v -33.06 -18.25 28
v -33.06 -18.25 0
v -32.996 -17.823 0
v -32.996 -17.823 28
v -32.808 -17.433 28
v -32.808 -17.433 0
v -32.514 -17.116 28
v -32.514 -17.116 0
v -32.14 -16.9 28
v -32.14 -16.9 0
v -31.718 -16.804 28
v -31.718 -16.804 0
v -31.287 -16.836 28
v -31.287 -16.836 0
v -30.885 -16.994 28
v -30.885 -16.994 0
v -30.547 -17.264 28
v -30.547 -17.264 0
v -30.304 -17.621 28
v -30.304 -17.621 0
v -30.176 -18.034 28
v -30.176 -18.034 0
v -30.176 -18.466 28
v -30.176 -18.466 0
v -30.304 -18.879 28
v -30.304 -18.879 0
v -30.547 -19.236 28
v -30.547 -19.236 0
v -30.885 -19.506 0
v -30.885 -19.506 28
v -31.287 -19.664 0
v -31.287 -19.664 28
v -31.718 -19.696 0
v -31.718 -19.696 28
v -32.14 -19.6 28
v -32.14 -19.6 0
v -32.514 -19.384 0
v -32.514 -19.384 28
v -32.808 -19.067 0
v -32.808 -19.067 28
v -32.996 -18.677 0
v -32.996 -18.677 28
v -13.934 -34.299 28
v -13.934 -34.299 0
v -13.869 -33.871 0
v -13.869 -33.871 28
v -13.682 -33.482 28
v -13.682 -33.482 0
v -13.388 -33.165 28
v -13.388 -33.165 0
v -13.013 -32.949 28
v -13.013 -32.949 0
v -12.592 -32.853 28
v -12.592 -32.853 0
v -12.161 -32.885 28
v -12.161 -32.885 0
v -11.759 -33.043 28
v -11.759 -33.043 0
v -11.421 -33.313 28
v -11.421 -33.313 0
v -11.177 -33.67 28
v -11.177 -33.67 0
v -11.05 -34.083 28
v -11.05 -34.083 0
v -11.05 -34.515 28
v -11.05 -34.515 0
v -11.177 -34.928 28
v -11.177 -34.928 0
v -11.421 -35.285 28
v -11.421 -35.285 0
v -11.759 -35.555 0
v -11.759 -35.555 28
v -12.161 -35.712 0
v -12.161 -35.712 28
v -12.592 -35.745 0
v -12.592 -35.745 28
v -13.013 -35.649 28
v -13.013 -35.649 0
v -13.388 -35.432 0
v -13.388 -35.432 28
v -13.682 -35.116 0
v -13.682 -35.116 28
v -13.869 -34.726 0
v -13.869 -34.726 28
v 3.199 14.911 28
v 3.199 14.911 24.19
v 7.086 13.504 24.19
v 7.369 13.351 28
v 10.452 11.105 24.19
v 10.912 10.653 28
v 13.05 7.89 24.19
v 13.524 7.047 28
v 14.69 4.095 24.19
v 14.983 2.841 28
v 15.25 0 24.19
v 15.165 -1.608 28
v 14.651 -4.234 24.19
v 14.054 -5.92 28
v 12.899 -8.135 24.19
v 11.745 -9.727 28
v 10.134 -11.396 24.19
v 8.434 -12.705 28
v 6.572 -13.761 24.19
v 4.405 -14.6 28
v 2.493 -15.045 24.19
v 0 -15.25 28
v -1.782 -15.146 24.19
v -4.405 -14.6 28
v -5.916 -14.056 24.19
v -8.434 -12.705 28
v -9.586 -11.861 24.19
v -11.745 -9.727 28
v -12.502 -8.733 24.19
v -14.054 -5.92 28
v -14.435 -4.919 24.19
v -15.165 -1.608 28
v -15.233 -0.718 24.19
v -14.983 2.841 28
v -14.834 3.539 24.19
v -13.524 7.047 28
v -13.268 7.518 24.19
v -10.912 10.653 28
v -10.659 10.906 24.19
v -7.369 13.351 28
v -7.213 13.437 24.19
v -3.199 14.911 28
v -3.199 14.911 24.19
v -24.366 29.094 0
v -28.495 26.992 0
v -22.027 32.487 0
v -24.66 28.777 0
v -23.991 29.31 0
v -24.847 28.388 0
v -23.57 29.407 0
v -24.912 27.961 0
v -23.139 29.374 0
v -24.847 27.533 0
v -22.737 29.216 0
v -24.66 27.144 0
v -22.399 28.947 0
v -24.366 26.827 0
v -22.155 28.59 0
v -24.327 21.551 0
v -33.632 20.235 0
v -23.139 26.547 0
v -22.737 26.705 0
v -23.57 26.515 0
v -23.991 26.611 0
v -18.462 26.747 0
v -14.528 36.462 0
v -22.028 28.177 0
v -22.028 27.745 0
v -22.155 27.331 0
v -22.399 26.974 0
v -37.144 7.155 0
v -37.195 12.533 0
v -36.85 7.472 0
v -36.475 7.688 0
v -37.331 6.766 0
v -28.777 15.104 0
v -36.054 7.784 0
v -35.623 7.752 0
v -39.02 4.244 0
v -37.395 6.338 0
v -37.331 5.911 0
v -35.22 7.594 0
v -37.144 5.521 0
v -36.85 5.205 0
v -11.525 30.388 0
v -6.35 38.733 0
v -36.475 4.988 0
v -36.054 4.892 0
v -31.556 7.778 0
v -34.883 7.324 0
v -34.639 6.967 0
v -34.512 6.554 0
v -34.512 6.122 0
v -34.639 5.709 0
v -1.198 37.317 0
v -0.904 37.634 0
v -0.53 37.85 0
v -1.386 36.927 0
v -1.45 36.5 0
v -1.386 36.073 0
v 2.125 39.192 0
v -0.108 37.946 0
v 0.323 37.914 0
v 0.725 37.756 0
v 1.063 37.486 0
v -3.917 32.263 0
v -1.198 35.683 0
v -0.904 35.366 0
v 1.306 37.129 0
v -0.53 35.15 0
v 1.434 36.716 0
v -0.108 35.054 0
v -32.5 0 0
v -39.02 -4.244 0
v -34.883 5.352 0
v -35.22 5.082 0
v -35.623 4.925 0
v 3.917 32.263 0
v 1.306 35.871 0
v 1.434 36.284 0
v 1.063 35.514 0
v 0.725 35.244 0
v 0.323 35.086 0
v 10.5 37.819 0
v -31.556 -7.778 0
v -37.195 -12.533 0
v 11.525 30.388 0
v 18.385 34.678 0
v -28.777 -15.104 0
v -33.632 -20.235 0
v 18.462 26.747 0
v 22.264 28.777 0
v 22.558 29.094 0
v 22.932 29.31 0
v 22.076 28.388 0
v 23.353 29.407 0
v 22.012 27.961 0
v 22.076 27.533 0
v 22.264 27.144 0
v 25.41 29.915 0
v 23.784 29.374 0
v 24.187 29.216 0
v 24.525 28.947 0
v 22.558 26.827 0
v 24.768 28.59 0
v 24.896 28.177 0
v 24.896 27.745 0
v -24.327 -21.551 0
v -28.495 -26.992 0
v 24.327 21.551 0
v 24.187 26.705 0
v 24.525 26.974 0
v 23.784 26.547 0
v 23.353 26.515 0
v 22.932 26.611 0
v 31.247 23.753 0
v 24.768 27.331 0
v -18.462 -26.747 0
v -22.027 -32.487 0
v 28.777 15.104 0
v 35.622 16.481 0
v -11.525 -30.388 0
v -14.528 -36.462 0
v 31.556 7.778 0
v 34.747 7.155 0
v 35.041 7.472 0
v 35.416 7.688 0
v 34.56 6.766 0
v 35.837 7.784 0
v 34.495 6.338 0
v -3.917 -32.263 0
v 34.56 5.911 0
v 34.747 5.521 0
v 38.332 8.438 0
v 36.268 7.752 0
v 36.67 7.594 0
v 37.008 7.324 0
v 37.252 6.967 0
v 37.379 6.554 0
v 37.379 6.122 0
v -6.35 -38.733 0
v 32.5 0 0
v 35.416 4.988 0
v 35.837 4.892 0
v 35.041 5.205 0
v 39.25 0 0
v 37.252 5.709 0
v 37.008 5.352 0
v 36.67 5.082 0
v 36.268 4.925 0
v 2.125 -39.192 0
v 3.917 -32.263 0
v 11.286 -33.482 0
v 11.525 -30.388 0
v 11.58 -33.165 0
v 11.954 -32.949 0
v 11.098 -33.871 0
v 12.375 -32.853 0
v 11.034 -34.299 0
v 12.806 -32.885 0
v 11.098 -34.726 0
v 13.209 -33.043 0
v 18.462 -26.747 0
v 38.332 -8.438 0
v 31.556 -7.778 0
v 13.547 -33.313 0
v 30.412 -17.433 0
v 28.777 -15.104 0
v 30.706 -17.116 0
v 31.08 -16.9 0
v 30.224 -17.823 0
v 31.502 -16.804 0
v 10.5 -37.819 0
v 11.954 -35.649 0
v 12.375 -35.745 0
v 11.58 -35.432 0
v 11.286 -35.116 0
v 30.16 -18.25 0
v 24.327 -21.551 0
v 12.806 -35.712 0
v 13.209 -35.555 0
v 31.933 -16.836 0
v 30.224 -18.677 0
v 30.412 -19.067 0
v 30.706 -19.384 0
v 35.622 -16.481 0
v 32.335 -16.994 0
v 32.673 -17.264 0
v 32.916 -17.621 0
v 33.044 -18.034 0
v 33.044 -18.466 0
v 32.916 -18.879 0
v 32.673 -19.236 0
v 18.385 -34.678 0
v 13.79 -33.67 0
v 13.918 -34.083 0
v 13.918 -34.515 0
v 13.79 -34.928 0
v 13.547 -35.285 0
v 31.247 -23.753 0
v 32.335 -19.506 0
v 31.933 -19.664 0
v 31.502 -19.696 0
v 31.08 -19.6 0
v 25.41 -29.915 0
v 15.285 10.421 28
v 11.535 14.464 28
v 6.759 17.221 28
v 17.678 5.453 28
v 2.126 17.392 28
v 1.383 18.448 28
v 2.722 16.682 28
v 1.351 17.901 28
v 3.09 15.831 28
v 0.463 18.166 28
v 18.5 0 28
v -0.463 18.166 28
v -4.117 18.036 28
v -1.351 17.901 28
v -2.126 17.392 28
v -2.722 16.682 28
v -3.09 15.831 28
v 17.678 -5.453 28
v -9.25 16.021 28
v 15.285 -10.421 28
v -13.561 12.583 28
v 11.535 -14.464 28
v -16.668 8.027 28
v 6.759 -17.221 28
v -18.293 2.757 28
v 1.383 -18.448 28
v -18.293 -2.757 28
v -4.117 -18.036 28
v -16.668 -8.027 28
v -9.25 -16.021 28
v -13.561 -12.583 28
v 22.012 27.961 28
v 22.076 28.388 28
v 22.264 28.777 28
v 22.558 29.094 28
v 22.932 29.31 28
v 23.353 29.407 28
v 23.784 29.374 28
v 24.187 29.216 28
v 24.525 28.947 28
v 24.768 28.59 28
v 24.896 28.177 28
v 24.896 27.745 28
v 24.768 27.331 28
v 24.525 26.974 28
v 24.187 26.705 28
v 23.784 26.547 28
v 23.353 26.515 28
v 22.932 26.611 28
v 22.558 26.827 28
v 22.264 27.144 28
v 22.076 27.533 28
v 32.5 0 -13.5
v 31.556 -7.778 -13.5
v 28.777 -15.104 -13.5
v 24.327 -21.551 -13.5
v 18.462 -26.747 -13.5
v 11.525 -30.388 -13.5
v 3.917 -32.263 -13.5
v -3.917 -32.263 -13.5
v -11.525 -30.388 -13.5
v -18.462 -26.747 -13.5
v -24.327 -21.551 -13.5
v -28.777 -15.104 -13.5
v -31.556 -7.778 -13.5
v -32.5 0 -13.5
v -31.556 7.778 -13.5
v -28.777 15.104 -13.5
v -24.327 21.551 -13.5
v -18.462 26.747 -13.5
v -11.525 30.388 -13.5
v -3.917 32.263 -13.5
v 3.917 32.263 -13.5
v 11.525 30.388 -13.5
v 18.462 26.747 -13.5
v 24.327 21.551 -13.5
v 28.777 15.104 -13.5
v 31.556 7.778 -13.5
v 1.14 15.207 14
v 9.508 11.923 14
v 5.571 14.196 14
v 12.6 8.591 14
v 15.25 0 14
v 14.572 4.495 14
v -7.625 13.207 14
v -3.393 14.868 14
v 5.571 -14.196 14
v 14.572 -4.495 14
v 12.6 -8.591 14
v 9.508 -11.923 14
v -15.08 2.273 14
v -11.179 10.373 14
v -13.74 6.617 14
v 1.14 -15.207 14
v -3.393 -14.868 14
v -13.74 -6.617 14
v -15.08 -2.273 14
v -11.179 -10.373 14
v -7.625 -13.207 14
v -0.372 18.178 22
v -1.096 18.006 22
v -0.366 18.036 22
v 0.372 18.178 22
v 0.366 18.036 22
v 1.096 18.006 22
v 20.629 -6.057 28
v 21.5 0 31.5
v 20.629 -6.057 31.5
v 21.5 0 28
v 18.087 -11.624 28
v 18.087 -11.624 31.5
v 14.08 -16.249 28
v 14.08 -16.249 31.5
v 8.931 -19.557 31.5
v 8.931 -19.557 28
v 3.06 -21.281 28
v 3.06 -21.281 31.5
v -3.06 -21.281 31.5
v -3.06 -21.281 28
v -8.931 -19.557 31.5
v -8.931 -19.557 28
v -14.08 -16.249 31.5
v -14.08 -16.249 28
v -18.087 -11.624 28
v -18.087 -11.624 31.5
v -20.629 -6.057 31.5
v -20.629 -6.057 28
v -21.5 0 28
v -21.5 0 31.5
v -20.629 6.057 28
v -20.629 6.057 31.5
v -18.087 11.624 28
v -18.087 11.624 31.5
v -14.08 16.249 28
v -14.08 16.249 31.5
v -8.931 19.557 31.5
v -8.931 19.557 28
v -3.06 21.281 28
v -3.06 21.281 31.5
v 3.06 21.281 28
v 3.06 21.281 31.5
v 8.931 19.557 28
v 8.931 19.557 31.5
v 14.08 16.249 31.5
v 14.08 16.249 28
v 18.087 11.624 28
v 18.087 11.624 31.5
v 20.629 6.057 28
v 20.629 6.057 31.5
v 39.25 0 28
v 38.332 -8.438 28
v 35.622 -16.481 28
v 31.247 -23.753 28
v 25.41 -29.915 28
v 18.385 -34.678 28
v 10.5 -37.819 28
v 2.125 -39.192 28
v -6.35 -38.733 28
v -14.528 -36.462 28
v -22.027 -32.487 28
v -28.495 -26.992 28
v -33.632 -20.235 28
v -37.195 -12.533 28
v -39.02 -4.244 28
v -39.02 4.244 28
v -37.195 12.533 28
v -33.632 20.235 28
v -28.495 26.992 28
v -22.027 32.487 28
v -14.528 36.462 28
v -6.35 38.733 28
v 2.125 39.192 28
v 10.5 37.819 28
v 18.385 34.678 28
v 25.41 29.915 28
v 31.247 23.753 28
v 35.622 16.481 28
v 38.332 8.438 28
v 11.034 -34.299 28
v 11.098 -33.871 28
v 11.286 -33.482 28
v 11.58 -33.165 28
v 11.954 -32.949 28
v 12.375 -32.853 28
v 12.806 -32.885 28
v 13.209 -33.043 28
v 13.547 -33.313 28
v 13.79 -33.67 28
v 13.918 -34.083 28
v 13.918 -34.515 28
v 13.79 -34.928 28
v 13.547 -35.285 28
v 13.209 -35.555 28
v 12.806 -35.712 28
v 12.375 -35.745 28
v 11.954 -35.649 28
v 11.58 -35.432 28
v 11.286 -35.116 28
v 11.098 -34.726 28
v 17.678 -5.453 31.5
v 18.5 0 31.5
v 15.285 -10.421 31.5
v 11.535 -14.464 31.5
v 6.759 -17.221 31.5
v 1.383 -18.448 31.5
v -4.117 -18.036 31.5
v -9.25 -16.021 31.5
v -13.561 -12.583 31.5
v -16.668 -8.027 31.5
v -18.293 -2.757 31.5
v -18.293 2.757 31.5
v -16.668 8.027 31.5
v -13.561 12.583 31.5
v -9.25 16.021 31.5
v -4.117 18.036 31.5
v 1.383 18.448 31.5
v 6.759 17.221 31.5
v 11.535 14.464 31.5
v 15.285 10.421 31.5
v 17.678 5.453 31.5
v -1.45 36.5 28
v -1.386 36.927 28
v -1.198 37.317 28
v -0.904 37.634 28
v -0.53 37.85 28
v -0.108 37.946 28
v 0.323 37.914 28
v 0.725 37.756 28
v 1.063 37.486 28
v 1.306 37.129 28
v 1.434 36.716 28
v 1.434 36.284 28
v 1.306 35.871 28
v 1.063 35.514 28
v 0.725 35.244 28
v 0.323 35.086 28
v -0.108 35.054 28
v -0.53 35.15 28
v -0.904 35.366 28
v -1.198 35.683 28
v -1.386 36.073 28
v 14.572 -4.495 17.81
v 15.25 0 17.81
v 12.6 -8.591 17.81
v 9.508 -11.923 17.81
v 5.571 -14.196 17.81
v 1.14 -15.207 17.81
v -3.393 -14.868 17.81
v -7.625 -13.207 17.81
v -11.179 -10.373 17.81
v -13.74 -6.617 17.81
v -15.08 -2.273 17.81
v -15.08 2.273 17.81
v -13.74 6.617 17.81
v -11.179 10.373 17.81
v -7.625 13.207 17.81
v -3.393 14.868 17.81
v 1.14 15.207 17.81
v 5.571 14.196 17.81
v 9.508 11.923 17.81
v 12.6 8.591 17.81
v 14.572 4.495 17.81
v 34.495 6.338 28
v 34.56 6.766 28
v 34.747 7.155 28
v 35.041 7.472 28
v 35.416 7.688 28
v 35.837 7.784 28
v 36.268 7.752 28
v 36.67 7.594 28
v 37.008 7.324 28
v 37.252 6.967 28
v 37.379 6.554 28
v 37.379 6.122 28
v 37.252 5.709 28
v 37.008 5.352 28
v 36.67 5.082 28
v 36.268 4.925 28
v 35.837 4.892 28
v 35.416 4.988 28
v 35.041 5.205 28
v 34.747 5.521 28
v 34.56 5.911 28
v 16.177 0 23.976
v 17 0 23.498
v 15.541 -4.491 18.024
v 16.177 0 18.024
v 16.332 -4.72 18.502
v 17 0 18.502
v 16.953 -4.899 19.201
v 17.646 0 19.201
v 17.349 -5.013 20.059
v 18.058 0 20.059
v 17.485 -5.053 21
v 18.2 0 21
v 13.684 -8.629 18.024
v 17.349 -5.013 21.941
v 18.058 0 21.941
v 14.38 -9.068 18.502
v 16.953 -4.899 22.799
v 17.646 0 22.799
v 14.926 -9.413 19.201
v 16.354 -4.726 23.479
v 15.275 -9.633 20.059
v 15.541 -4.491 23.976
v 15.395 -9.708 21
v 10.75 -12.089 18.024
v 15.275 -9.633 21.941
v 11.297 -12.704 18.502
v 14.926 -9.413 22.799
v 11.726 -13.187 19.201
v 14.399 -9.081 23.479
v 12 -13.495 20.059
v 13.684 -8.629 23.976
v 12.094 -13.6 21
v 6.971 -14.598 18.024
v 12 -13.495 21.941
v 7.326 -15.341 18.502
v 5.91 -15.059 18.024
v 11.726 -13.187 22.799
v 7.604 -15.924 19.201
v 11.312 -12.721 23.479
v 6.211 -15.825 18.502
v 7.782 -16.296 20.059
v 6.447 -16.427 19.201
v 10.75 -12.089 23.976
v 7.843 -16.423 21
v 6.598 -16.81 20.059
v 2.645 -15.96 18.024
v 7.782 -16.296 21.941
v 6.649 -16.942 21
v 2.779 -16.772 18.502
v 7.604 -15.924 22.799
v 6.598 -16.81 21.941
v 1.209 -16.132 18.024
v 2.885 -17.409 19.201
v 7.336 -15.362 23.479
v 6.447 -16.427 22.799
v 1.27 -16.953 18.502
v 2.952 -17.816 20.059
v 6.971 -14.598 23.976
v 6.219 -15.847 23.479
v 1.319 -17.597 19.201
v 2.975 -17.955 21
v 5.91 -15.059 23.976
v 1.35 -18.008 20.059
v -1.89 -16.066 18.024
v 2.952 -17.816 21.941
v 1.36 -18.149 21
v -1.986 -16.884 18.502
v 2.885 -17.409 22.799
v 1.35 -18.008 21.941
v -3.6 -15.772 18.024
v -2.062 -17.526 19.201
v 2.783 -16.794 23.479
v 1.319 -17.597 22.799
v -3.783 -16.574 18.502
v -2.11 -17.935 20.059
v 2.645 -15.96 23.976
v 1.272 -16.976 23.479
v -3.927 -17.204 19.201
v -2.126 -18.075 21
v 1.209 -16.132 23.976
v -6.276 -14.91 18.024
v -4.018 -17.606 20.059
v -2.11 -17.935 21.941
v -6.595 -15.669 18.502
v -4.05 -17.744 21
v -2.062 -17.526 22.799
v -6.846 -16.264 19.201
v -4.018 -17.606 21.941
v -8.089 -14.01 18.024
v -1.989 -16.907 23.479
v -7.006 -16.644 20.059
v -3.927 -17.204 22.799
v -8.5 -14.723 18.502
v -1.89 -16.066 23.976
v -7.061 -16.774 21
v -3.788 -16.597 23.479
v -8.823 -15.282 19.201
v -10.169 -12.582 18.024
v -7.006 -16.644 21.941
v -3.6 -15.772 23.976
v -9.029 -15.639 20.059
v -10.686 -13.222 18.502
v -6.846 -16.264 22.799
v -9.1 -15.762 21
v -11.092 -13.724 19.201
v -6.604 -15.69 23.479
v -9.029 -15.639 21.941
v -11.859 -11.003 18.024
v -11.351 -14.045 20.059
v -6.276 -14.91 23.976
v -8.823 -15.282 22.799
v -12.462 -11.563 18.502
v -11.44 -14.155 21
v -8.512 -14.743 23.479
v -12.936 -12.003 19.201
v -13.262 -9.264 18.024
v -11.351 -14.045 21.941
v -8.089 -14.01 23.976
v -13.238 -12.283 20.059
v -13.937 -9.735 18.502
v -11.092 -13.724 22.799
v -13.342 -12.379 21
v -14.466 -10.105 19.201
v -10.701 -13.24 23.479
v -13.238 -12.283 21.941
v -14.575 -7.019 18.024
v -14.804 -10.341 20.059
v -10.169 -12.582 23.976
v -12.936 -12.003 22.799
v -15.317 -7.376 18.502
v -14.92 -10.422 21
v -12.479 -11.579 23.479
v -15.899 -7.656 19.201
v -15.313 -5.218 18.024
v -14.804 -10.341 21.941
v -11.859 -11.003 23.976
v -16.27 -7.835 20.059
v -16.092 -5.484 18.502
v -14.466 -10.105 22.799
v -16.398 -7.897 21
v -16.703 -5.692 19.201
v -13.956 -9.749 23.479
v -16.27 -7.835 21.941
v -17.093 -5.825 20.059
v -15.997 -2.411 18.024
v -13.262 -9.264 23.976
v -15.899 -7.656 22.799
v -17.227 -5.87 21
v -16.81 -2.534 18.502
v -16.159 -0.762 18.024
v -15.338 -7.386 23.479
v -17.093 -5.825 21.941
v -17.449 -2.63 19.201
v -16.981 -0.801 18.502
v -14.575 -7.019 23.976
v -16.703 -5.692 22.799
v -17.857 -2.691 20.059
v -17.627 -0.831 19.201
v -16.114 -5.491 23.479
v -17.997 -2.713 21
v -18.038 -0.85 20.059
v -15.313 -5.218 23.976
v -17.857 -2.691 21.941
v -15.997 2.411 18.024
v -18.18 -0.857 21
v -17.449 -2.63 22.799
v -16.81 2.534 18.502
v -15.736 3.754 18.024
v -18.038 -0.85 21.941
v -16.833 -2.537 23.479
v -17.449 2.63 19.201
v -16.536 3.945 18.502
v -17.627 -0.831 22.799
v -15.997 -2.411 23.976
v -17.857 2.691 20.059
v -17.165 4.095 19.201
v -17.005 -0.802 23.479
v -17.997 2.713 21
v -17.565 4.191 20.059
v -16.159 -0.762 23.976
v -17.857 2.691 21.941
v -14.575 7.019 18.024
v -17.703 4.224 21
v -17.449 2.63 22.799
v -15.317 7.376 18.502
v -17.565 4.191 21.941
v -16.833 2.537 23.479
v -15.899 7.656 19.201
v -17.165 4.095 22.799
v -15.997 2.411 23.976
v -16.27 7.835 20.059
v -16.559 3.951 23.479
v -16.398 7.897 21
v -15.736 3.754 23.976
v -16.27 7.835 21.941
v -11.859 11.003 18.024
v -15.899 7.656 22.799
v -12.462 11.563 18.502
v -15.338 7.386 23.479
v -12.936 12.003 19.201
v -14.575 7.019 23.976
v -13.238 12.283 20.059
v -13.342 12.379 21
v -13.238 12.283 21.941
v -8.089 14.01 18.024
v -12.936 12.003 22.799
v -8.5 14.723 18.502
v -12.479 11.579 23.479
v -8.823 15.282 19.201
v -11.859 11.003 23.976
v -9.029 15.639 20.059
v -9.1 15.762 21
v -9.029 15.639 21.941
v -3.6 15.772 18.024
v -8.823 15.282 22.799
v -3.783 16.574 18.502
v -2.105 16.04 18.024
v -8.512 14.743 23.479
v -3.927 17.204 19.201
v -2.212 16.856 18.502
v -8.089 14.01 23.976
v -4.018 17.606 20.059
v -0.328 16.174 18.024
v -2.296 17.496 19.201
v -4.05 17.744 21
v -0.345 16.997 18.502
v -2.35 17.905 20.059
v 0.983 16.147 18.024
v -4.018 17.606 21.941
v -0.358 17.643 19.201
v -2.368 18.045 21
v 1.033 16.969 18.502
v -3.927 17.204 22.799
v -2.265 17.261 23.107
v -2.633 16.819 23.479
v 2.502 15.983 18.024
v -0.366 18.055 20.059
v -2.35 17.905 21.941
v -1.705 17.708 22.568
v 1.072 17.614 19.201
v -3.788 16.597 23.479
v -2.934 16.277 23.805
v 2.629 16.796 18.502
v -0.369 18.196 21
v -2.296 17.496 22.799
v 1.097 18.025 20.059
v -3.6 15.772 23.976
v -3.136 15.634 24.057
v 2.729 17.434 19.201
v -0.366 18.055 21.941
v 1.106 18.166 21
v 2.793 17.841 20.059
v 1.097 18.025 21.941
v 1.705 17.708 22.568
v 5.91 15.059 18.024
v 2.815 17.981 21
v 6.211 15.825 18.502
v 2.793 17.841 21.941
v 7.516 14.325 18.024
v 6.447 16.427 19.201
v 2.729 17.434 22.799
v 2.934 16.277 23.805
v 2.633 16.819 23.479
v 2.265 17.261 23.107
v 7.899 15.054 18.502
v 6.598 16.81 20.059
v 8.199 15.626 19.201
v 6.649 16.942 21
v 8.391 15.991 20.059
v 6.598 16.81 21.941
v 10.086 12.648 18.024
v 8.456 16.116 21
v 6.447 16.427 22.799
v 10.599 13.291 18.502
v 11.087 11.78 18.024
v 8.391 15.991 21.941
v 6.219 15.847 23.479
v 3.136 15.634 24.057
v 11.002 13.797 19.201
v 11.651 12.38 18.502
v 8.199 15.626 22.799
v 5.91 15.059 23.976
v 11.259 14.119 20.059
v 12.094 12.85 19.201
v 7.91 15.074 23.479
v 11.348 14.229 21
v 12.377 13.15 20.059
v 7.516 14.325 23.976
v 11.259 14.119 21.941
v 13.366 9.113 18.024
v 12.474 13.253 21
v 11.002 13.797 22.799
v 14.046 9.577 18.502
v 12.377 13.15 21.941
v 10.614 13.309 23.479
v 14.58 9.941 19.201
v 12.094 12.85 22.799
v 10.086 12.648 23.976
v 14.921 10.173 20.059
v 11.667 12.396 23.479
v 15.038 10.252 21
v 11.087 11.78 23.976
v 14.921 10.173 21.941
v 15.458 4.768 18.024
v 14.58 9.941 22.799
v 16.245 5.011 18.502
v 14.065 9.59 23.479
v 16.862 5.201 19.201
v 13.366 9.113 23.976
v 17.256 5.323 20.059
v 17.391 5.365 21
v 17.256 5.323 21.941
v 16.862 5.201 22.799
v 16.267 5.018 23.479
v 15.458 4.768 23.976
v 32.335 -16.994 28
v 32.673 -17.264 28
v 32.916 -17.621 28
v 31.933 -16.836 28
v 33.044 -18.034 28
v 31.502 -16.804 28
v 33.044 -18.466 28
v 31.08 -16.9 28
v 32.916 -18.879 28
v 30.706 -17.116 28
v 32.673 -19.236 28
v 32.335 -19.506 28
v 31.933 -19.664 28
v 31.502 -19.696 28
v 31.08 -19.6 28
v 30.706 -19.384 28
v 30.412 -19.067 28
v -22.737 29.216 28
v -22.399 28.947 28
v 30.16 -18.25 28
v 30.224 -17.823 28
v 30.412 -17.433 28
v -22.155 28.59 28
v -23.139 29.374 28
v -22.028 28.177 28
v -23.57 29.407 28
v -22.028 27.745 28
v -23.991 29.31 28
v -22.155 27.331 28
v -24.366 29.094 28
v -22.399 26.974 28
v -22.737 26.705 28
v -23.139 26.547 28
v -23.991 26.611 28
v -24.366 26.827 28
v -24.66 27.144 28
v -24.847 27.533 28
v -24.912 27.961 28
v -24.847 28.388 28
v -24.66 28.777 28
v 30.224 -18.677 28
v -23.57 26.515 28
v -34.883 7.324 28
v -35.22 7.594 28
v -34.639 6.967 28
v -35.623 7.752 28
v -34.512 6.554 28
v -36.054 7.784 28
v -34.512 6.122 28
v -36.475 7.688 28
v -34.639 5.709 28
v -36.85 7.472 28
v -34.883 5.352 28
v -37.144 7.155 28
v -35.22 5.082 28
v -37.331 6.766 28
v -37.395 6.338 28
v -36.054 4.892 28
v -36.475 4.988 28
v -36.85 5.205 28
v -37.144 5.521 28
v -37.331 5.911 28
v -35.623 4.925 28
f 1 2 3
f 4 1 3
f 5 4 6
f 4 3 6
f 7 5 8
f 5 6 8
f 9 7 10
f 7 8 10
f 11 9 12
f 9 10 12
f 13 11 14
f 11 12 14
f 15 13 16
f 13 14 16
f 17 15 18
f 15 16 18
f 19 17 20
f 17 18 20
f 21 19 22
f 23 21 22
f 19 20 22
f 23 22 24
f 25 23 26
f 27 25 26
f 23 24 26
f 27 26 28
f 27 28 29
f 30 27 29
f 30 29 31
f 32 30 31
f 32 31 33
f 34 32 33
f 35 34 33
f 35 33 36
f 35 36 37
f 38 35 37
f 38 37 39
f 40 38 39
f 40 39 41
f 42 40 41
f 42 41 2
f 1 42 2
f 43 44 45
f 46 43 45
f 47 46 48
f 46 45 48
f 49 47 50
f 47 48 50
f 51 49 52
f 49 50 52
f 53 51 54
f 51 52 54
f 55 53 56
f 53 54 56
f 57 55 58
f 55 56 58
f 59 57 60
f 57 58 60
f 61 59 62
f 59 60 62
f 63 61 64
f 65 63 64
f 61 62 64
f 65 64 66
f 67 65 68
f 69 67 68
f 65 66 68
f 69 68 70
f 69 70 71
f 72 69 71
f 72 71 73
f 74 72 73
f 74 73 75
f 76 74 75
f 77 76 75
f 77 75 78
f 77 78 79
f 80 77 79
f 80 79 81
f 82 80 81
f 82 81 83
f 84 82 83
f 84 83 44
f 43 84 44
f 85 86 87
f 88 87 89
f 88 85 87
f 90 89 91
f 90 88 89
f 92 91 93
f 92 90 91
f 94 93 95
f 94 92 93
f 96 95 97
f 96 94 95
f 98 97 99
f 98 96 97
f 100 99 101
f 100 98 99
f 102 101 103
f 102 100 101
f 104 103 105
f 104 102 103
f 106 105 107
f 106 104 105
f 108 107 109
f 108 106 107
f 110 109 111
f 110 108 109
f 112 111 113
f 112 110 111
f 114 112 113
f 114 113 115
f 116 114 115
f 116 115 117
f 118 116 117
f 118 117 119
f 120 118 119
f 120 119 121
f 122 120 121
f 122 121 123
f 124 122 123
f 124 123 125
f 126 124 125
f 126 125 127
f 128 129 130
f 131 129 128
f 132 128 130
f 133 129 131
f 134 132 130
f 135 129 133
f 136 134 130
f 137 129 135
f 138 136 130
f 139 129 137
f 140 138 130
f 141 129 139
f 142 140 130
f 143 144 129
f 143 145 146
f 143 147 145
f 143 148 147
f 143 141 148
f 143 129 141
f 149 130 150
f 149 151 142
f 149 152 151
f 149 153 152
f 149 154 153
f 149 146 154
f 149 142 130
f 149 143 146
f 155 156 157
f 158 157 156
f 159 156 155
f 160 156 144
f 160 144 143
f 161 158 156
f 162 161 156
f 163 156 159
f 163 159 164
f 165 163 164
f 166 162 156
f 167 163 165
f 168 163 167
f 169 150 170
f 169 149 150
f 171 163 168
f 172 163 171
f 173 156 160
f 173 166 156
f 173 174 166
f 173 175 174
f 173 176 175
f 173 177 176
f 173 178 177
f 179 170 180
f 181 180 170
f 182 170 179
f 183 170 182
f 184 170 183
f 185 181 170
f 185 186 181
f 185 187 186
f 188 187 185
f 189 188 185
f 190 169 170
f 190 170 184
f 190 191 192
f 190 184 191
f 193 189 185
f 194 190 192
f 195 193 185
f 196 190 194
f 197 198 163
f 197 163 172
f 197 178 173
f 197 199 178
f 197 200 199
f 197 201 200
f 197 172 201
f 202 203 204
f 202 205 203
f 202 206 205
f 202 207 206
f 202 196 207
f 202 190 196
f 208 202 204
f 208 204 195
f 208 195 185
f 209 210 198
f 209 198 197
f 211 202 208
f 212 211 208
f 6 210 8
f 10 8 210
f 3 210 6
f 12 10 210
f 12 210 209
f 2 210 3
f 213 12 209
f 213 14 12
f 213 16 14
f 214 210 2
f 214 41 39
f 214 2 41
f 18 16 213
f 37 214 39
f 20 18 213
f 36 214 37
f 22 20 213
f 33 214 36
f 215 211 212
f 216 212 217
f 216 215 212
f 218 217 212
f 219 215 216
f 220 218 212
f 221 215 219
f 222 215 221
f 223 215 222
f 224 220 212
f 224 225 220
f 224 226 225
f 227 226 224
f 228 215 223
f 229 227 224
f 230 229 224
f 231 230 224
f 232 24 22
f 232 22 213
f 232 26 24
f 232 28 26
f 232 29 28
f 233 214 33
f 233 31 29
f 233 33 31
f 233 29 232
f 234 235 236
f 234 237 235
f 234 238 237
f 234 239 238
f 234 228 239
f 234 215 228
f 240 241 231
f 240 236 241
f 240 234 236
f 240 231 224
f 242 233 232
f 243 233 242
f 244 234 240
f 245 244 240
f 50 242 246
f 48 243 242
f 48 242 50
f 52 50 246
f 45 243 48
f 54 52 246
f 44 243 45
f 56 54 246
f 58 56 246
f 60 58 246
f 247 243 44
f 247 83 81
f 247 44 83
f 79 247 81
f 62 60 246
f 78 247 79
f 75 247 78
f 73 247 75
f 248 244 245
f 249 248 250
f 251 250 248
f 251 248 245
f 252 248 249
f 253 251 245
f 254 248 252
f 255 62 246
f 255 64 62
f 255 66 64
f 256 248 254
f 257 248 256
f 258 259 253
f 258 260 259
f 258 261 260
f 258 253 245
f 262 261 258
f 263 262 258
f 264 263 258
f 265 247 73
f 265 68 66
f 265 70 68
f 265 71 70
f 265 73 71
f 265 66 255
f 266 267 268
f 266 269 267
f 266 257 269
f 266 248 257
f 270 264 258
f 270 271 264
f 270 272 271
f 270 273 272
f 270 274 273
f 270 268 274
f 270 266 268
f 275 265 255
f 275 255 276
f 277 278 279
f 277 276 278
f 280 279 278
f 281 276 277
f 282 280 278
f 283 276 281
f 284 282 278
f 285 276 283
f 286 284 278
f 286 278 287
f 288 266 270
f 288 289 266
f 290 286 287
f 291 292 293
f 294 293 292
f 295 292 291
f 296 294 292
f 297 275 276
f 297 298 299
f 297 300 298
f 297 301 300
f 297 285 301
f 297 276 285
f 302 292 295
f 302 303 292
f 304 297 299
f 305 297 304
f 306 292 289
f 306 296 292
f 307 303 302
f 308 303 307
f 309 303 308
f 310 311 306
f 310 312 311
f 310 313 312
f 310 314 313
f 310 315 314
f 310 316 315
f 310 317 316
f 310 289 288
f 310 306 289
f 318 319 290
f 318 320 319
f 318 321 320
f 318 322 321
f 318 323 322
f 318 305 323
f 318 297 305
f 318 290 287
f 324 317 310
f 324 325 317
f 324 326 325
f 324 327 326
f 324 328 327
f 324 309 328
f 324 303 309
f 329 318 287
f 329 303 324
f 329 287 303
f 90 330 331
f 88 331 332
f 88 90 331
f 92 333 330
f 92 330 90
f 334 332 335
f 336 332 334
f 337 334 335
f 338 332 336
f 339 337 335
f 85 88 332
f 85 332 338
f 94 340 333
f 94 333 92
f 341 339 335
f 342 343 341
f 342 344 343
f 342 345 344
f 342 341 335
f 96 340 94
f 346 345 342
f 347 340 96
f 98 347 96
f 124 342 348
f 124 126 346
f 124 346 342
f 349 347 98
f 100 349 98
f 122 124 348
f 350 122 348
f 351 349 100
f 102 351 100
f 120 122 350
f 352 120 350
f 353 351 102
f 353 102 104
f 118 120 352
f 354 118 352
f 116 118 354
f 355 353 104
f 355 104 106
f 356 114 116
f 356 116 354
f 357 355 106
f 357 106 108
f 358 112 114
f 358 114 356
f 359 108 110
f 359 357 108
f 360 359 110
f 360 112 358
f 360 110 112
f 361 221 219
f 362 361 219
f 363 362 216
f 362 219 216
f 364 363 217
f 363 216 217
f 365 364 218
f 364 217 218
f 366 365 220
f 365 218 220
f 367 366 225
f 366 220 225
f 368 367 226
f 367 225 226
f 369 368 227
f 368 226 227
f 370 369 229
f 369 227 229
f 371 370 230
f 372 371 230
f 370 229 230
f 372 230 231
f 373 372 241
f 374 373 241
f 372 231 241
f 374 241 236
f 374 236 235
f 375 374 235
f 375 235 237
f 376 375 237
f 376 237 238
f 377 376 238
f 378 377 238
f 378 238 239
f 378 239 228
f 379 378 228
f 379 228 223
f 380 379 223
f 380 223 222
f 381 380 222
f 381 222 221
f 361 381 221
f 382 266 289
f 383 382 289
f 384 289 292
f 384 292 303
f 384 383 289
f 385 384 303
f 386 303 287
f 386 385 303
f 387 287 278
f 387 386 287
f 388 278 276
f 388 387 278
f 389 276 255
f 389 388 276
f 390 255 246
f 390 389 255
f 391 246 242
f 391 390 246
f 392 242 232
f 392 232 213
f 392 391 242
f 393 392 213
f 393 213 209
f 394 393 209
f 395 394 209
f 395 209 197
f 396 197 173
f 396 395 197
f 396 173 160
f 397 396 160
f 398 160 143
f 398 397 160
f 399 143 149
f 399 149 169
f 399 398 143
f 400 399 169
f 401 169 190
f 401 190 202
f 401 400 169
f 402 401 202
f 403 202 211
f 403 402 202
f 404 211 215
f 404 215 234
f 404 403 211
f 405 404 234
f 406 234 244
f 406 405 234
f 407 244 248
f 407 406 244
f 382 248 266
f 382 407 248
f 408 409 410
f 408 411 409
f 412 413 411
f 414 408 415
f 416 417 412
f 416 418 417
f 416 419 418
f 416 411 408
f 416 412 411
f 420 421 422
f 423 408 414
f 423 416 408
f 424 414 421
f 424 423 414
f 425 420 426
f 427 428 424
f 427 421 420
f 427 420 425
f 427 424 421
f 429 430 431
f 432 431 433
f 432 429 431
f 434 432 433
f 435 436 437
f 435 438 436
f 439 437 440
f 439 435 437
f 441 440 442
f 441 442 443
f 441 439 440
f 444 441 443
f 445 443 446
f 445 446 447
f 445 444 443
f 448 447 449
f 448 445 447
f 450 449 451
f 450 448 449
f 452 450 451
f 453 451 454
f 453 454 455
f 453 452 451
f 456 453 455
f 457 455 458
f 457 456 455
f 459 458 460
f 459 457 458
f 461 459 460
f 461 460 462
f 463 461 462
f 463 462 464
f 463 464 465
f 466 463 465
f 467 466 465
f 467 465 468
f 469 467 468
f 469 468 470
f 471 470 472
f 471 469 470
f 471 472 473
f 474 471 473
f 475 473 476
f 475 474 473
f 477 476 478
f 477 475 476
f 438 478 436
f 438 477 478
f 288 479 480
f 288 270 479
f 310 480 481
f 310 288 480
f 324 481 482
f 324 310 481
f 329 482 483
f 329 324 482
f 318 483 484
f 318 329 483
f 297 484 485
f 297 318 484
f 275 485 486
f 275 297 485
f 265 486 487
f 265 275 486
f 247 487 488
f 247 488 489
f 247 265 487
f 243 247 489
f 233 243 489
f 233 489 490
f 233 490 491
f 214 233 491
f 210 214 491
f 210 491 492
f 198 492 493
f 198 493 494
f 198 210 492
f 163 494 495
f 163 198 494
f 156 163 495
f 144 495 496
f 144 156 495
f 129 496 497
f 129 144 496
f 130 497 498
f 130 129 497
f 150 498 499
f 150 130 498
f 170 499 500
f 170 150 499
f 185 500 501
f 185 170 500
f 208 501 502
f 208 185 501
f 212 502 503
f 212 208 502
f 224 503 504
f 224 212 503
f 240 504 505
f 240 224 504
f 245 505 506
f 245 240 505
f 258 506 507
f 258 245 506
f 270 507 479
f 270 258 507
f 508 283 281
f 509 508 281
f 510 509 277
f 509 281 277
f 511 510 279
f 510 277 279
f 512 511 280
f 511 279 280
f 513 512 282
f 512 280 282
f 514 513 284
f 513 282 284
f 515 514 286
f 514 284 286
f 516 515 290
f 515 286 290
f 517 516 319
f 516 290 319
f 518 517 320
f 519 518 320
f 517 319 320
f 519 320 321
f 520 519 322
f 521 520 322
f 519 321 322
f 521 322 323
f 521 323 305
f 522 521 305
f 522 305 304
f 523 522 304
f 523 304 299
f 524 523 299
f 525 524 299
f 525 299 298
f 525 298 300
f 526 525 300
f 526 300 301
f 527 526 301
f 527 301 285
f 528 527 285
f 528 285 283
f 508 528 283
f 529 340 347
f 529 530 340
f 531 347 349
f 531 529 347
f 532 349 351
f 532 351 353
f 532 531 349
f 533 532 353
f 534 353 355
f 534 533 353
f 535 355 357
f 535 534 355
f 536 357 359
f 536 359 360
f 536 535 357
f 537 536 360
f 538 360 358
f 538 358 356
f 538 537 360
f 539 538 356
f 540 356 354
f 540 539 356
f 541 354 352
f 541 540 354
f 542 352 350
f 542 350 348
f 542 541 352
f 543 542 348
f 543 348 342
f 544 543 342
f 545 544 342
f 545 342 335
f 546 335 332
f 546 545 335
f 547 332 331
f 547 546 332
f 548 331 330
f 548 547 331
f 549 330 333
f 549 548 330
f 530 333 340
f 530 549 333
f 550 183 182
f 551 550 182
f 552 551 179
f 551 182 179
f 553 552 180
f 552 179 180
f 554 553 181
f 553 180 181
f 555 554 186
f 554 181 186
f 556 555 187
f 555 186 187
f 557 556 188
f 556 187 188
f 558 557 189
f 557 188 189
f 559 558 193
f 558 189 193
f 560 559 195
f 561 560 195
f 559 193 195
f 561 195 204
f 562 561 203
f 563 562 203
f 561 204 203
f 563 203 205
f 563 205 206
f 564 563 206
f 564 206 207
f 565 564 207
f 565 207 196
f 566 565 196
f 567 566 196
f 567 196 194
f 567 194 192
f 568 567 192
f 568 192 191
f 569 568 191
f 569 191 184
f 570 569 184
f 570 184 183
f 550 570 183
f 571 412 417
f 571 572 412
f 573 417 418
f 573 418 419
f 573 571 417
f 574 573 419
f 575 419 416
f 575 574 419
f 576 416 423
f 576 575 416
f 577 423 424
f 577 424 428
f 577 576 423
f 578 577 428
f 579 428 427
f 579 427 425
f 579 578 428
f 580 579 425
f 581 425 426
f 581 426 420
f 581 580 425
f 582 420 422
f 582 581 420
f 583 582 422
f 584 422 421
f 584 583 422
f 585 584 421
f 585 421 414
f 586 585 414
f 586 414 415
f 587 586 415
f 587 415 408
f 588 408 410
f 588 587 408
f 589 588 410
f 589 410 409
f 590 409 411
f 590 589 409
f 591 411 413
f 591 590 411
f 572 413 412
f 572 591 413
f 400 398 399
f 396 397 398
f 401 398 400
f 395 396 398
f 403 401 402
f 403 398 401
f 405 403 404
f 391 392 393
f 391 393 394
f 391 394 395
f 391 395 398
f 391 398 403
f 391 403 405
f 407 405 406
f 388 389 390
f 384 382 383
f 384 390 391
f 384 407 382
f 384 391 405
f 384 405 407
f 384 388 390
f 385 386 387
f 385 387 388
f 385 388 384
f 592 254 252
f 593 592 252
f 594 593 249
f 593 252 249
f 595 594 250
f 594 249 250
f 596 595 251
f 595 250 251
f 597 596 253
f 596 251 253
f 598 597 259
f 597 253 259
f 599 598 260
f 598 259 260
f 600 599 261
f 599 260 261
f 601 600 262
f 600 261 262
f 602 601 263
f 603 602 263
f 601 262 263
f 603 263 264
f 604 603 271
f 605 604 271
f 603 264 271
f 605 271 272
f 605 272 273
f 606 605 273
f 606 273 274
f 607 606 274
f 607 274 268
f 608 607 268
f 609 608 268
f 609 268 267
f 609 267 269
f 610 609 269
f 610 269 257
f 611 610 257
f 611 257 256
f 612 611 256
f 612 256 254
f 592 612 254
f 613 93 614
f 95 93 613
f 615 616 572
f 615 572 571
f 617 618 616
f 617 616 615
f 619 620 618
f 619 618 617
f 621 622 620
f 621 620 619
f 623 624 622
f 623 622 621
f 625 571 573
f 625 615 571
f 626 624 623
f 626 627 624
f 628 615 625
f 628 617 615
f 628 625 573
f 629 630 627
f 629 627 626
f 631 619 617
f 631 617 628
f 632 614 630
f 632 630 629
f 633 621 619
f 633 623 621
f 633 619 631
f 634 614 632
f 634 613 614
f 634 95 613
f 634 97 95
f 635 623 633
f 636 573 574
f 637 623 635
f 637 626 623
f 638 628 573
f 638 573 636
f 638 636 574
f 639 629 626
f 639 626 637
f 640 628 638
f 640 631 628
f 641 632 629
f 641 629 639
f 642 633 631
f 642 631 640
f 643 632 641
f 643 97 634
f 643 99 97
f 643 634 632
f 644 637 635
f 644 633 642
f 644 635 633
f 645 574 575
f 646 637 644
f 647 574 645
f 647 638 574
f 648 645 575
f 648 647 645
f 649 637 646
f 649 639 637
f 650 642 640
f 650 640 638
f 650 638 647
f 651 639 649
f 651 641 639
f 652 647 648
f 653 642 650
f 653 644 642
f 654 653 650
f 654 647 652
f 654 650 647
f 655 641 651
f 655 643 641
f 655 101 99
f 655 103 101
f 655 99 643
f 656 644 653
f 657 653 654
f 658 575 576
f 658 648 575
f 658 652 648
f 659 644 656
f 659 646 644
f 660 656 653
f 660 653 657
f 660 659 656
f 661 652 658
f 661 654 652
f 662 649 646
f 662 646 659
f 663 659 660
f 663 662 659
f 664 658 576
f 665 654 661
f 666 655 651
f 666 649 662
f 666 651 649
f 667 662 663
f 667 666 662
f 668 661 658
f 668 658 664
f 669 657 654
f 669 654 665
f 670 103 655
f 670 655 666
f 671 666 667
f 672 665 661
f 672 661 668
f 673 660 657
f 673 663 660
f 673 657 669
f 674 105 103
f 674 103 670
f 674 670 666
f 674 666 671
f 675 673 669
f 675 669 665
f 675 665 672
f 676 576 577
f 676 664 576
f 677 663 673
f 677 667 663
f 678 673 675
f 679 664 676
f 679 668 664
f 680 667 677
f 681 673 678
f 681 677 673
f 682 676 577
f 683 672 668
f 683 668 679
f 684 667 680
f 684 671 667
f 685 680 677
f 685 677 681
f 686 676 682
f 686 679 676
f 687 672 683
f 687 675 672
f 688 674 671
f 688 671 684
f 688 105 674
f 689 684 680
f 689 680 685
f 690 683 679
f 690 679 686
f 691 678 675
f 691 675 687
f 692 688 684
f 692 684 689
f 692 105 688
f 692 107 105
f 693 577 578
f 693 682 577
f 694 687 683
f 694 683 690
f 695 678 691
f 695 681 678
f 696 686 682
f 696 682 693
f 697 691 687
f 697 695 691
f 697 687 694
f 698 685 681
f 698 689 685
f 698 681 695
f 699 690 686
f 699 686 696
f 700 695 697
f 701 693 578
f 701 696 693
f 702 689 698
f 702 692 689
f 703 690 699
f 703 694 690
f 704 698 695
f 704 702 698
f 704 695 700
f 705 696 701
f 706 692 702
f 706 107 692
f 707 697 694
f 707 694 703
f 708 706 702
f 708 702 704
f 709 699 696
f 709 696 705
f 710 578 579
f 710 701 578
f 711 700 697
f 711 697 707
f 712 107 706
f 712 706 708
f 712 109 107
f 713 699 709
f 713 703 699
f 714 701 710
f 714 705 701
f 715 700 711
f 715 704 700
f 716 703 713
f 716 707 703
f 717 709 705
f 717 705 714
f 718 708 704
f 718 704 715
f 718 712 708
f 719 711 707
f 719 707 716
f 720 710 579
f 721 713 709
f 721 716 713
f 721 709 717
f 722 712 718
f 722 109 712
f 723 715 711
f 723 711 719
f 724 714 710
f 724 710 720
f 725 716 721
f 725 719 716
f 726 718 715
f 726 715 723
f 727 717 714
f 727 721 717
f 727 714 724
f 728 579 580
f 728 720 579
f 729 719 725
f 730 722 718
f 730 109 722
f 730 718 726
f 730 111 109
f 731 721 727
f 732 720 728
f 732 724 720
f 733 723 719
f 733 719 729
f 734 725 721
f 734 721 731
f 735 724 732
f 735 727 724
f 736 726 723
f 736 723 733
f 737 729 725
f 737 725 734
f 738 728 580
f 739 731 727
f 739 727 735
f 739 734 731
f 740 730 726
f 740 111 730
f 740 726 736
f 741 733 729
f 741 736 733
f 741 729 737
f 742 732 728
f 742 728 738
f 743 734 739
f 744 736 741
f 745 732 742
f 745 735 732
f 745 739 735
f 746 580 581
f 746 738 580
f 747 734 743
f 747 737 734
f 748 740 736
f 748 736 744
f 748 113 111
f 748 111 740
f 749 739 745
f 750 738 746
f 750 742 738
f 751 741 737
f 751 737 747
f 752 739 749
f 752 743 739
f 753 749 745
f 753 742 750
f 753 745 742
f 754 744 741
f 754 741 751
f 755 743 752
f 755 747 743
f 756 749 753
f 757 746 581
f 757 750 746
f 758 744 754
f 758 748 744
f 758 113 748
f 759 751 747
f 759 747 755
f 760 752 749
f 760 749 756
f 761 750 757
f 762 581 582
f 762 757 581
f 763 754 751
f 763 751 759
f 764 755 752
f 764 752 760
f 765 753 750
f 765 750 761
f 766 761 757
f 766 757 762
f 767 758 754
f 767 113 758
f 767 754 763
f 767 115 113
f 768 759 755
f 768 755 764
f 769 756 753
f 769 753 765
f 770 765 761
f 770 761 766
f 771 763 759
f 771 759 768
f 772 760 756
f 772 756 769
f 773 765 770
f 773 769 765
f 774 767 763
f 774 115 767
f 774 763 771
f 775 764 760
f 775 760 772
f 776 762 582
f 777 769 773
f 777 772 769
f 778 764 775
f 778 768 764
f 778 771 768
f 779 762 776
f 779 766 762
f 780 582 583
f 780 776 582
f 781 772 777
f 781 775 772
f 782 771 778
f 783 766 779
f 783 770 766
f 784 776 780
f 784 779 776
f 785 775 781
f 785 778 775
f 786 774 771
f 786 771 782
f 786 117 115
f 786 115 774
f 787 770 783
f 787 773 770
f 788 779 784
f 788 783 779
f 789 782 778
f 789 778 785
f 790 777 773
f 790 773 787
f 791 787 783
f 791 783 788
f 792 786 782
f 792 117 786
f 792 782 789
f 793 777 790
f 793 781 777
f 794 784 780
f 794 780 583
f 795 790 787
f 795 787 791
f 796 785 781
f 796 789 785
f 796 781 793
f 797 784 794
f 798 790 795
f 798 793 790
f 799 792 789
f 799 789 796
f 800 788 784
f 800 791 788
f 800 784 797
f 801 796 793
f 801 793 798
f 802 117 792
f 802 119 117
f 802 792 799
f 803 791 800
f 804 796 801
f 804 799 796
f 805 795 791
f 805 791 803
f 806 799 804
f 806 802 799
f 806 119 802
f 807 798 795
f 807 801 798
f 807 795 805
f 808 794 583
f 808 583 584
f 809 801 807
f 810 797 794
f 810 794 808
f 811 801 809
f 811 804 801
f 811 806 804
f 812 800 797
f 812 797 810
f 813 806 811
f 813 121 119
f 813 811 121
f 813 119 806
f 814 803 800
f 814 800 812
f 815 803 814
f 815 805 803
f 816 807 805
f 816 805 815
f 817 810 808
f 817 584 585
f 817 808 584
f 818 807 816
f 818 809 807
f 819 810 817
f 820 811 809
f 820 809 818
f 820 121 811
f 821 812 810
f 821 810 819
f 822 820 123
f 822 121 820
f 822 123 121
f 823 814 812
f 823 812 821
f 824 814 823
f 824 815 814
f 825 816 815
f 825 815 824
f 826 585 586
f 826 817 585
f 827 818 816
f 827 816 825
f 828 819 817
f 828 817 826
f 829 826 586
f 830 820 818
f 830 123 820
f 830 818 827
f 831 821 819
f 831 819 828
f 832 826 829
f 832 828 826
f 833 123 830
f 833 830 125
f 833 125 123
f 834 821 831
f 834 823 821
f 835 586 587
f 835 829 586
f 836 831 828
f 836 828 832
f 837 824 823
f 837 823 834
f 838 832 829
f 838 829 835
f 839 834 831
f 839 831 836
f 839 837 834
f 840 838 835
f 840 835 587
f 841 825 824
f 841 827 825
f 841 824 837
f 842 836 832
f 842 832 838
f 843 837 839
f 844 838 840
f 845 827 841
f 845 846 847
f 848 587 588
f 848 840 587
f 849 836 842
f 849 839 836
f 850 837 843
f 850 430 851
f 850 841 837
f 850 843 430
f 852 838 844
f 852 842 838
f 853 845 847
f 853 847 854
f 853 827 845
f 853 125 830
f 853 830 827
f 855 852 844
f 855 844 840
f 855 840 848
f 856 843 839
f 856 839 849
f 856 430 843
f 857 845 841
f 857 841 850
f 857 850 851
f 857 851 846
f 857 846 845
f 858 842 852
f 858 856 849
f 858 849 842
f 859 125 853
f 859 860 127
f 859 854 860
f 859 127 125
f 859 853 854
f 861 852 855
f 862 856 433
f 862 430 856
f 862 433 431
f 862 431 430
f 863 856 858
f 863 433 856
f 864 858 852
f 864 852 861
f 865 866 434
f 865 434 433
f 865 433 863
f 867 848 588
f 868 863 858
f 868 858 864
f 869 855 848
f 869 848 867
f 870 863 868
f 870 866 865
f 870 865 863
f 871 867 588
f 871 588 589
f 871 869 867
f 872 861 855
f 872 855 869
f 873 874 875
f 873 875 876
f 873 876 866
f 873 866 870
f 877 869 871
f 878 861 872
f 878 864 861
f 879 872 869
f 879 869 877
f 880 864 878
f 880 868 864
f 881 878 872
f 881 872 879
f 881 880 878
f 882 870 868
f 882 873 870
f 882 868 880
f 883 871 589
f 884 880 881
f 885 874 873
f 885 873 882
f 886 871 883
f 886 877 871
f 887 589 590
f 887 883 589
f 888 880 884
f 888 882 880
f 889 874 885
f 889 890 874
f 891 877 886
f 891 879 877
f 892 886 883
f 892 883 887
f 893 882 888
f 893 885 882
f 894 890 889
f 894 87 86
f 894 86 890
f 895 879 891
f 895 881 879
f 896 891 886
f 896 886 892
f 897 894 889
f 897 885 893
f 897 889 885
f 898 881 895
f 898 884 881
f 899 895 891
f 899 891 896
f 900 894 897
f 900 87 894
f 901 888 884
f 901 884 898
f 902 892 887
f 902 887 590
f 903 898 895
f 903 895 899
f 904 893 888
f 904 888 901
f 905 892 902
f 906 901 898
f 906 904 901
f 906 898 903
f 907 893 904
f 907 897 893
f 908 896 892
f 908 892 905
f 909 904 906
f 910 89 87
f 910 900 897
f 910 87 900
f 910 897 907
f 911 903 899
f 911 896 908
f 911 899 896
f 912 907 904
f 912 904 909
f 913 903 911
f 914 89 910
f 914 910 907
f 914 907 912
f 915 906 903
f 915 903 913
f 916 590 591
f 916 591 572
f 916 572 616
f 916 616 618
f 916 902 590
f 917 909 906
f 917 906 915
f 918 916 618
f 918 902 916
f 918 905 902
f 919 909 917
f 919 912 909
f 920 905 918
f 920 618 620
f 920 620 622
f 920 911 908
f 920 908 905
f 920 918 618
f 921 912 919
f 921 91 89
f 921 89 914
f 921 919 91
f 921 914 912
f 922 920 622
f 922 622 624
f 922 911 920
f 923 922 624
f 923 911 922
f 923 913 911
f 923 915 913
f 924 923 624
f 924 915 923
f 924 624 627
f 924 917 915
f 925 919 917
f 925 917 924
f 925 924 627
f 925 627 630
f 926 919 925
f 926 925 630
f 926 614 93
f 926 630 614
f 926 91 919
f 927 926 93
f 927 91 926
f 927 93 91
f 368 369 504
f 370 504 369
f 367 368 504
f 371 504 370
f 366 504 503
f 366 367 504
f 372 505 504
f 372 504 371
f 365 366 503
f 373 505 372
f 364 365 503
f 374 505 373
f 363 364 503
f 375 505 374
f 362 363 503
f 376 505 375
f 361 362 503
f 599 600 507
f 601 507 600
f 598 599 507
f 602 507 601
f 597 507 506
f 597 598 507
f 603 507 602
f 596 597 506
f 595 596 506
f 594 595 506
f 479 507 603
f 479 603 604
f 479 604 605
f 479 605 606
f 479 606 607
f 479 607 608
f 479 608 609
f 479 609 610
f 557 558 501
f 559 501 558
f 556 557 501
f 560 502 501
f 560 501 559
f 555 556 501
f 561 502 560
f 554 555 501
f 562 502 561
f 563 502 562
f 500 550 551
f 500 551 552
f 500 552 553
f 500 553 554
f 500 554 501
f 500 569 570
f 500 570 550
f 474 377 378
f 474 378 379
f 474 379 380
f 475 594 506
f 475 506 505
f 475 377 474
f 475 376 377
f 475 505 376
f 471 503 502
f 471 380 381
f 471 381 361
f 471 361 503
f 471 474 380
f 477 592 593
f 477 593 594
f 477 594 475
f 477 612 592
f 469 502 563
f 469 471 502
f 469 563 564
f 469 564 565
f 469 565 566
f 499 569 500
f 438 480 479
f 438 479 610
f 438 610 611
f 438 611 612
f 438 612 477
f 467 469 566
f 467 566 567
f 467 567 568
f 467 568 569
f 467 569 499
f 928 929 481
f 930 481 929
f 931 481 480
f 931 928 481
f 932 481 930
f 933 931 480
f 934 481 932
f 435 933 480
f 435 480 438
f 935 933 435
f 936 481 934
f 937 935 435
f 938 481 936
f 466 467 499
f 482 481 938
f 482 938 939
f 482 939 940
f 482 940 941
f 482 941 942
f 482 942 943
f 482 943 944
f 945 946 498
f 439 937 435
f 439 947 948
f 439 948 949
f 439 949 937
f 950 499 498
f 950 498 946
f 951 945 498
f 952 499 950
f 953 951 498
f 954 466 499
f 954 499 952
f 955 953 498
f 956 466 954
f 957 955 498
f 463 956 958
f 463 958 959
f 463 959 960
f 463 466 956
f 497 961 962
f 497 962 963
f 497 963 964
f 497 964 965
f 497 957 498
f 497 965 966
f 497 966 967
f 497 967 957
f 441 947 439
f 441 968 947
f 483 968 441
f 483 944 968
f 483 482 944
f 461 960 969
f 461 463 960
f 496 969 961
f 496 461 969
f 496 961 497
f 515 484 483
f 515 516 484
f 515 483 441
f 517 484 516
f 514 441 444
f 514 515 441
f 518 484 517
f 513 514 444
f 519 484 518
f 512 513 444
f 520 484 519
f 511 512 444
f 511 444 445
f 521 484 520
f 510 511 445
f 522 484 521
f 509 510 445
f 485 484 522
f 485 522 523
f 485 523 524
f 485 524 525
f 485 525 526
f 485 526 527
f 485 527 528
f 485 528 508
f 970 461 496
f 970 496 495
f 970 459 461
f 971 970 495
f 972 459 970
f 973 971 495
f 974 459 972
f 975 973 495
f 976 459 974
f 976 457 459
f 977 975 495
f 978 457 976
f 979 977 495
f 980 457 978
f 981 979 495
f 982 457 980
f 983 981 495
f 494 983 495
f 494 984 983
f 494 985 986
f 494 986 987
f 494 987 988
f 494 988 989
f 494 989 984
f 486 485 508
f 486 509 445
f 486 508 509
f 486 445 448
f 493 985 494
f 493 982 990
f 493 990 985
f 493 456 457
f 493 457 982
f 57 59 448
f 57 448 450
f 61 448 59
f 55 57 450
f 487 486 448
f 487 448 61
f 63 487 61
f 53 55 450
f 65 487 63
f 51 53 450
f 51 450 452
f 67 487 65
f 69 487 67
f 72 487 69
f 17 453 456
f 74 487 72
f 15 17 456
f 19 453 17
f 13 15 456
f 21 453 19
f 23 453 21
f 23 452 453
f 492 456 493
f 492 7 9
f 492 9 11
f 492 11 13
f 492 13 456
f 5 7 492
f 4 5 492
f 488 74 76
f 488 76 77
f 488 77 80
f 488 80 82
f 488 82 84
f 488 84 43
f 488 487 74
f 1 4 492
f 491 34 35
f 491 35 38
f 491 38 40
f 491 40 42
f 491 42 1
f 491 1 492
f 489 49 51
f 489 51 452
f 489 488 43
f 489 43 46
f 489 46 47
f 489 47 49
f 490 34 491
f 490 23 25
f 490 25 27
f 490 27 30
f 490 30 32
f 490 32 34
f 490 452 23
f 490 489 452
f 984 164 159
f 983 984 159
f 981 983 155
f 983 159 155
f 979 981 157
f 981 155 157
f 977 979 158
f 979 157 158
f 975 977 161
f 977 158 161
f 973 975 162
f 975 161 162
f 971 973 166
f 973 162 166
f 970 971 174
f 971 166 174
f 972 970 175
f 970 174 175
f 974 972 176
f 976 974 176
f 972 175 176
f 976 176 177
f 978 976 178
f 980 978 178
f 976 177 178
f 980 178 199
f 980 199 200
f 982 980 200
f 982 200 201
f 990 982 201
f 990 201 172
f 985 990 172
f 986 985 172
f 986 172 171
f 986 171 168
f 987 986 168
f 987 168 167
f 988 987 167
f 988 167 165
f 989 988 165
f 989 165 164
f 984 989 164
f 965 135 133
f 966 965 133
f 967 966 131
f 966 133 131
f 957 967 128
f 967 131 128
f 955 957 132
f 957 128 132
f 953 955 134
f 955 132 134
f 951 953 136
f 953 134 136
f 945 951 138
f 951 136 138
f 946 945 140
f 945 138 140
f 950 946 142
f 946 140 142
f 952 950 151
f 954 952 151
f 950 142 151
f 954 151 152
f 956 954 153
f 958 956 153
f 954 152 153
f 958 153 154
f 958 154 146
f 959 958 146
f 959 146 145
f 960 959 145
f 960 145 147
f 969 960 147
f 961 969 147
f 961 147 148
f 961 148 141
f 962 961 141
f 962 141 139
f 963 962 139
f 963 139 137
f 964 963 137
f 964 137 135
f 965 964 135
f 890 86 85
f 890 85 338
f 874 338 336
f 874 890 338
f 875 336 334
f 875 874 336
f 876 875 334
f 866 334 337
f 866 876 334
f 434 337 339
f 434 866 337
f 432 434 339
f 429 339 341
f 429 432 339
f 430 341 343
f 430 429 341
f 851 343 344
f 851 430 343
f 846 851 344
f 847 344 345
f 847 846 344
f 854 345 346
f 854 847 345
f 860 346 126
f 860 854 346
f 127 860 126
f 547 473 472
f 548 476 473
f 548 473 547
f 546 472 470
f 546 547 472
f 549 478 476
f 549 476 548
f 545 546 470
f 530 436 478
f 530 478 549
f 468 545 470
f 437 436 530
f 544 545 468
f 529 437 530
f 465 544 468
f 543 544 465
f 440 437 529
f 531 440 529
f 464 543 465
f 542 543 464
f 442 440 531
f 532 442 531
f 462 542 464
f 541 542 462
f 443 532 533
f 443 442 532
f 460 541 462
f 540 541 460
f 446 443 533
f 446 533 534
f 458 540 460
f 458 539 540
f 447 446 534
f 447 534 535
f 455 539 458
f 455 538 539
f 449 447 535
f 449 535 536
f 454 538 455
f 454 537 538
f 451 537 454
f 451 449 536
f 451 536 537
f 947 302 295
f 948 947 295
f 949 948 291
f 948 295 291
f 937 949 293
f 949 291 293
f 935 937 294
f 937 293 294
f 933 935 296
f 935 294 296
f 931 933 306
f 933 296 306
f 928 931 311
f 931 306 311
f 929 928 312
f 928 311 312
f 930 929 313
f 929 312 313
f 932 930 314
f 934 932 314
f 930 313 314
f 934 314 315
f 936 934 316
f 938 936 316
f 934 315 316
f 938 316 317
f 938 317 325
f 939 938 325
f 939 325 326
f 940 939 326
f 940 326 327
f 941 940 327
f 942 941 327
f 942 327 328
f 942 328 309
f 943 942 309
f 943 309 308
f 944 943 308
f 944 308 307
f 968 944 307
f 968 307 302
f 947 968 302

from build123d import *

# Parameters (mm, degrees)
F_3_0MM_DOWEL_HOLE3_D   = 2.9
CUT_EXTRUDE1_DEPTH      = 70.306384987
CUT_EXTRUDE1_DEPTH_BACK = 6
SKETCH15_R              = 3.2


with BuildPart() as part:
    # Sketch12 → Revolve2 (revolve)
    with BuildSketch(Plane(origin=(0, 0, 0), x_dir=(0, 0, -1), z_dir=(1, 0, 0)), mode=Mode.PRIVATE) as revolve2_sk:
        with BuildLine():
            ThreePointArc((-17.809780572, 15.25), (-21, 18.2), (-24.190219428, 15.25))
            Line((-24.190219428, 15.25), (-28, 15.25))
            Line((-28, 15.25), (-28, 18.5))
            Line((-28, 18.5), (-31.5, 18.5))
            Line((-31.5, 18.5), (-31.5, 21.5))
            Line((-31.5, 21.5), (-28, 21.5))
            Line((-28, 21.5), (-28, 39.25))
            Line((-28, 39.25), (0, 39.25))
            Line((0, 39.25), (0, 32.5))
            Line((0, 32.5), (13.5, 32.5))
            Line((13.5, 32.5), (13.5, 0))
            Line((13.5, 0), (-14, 0))
            Line((-14, 0), (-14, 15.25))
            Line((-14, 15.25), (-17.809780572, 15.25))
        make_face()
    revolve(revolve2_sk.sketch.rotate(Axis((0, 0, 41.148719721), (0, 0, -1)), 90), axis=Axis((0, 0, 41.148719721), (0, 0, -1)))

    # Ø3.0mm Dowel Hole3 (through all)
    with Locations(Plane.XY.offset(28)):
        with Locations((-23.461747754, 27.960622174), (0, 36.5), (23.461747754, 27.960622174), (35.945482985, 6.338158485), (31.609927238, -18.25), (12.483735231, -34.298780659), (-12.483735231, -34.298780659), (-31.609927238, -18.25), (-35.945482985, 6.338158485)):
            Hole(F_3_0MM_DOWEL_HOLE3_D / 2)

    # Sketch15 → Cut-Extrude1 (cut, two sides: drawn at the far end of the back side and taken through both)
    with BuildSketch(Plane.XY.offset(28).offset(-CUT_EXTRUDE1_DEPTH_BACK)):
        with Locations((0, 15)):
            Circle(SKETCH15_R)
    extrude(amount=CUT_EXTRUDE1_DEPTH + CUT_EXTRUDE1_DEPTH_BACK, mode=Mode.SUBTRACT)


solid = part.part
